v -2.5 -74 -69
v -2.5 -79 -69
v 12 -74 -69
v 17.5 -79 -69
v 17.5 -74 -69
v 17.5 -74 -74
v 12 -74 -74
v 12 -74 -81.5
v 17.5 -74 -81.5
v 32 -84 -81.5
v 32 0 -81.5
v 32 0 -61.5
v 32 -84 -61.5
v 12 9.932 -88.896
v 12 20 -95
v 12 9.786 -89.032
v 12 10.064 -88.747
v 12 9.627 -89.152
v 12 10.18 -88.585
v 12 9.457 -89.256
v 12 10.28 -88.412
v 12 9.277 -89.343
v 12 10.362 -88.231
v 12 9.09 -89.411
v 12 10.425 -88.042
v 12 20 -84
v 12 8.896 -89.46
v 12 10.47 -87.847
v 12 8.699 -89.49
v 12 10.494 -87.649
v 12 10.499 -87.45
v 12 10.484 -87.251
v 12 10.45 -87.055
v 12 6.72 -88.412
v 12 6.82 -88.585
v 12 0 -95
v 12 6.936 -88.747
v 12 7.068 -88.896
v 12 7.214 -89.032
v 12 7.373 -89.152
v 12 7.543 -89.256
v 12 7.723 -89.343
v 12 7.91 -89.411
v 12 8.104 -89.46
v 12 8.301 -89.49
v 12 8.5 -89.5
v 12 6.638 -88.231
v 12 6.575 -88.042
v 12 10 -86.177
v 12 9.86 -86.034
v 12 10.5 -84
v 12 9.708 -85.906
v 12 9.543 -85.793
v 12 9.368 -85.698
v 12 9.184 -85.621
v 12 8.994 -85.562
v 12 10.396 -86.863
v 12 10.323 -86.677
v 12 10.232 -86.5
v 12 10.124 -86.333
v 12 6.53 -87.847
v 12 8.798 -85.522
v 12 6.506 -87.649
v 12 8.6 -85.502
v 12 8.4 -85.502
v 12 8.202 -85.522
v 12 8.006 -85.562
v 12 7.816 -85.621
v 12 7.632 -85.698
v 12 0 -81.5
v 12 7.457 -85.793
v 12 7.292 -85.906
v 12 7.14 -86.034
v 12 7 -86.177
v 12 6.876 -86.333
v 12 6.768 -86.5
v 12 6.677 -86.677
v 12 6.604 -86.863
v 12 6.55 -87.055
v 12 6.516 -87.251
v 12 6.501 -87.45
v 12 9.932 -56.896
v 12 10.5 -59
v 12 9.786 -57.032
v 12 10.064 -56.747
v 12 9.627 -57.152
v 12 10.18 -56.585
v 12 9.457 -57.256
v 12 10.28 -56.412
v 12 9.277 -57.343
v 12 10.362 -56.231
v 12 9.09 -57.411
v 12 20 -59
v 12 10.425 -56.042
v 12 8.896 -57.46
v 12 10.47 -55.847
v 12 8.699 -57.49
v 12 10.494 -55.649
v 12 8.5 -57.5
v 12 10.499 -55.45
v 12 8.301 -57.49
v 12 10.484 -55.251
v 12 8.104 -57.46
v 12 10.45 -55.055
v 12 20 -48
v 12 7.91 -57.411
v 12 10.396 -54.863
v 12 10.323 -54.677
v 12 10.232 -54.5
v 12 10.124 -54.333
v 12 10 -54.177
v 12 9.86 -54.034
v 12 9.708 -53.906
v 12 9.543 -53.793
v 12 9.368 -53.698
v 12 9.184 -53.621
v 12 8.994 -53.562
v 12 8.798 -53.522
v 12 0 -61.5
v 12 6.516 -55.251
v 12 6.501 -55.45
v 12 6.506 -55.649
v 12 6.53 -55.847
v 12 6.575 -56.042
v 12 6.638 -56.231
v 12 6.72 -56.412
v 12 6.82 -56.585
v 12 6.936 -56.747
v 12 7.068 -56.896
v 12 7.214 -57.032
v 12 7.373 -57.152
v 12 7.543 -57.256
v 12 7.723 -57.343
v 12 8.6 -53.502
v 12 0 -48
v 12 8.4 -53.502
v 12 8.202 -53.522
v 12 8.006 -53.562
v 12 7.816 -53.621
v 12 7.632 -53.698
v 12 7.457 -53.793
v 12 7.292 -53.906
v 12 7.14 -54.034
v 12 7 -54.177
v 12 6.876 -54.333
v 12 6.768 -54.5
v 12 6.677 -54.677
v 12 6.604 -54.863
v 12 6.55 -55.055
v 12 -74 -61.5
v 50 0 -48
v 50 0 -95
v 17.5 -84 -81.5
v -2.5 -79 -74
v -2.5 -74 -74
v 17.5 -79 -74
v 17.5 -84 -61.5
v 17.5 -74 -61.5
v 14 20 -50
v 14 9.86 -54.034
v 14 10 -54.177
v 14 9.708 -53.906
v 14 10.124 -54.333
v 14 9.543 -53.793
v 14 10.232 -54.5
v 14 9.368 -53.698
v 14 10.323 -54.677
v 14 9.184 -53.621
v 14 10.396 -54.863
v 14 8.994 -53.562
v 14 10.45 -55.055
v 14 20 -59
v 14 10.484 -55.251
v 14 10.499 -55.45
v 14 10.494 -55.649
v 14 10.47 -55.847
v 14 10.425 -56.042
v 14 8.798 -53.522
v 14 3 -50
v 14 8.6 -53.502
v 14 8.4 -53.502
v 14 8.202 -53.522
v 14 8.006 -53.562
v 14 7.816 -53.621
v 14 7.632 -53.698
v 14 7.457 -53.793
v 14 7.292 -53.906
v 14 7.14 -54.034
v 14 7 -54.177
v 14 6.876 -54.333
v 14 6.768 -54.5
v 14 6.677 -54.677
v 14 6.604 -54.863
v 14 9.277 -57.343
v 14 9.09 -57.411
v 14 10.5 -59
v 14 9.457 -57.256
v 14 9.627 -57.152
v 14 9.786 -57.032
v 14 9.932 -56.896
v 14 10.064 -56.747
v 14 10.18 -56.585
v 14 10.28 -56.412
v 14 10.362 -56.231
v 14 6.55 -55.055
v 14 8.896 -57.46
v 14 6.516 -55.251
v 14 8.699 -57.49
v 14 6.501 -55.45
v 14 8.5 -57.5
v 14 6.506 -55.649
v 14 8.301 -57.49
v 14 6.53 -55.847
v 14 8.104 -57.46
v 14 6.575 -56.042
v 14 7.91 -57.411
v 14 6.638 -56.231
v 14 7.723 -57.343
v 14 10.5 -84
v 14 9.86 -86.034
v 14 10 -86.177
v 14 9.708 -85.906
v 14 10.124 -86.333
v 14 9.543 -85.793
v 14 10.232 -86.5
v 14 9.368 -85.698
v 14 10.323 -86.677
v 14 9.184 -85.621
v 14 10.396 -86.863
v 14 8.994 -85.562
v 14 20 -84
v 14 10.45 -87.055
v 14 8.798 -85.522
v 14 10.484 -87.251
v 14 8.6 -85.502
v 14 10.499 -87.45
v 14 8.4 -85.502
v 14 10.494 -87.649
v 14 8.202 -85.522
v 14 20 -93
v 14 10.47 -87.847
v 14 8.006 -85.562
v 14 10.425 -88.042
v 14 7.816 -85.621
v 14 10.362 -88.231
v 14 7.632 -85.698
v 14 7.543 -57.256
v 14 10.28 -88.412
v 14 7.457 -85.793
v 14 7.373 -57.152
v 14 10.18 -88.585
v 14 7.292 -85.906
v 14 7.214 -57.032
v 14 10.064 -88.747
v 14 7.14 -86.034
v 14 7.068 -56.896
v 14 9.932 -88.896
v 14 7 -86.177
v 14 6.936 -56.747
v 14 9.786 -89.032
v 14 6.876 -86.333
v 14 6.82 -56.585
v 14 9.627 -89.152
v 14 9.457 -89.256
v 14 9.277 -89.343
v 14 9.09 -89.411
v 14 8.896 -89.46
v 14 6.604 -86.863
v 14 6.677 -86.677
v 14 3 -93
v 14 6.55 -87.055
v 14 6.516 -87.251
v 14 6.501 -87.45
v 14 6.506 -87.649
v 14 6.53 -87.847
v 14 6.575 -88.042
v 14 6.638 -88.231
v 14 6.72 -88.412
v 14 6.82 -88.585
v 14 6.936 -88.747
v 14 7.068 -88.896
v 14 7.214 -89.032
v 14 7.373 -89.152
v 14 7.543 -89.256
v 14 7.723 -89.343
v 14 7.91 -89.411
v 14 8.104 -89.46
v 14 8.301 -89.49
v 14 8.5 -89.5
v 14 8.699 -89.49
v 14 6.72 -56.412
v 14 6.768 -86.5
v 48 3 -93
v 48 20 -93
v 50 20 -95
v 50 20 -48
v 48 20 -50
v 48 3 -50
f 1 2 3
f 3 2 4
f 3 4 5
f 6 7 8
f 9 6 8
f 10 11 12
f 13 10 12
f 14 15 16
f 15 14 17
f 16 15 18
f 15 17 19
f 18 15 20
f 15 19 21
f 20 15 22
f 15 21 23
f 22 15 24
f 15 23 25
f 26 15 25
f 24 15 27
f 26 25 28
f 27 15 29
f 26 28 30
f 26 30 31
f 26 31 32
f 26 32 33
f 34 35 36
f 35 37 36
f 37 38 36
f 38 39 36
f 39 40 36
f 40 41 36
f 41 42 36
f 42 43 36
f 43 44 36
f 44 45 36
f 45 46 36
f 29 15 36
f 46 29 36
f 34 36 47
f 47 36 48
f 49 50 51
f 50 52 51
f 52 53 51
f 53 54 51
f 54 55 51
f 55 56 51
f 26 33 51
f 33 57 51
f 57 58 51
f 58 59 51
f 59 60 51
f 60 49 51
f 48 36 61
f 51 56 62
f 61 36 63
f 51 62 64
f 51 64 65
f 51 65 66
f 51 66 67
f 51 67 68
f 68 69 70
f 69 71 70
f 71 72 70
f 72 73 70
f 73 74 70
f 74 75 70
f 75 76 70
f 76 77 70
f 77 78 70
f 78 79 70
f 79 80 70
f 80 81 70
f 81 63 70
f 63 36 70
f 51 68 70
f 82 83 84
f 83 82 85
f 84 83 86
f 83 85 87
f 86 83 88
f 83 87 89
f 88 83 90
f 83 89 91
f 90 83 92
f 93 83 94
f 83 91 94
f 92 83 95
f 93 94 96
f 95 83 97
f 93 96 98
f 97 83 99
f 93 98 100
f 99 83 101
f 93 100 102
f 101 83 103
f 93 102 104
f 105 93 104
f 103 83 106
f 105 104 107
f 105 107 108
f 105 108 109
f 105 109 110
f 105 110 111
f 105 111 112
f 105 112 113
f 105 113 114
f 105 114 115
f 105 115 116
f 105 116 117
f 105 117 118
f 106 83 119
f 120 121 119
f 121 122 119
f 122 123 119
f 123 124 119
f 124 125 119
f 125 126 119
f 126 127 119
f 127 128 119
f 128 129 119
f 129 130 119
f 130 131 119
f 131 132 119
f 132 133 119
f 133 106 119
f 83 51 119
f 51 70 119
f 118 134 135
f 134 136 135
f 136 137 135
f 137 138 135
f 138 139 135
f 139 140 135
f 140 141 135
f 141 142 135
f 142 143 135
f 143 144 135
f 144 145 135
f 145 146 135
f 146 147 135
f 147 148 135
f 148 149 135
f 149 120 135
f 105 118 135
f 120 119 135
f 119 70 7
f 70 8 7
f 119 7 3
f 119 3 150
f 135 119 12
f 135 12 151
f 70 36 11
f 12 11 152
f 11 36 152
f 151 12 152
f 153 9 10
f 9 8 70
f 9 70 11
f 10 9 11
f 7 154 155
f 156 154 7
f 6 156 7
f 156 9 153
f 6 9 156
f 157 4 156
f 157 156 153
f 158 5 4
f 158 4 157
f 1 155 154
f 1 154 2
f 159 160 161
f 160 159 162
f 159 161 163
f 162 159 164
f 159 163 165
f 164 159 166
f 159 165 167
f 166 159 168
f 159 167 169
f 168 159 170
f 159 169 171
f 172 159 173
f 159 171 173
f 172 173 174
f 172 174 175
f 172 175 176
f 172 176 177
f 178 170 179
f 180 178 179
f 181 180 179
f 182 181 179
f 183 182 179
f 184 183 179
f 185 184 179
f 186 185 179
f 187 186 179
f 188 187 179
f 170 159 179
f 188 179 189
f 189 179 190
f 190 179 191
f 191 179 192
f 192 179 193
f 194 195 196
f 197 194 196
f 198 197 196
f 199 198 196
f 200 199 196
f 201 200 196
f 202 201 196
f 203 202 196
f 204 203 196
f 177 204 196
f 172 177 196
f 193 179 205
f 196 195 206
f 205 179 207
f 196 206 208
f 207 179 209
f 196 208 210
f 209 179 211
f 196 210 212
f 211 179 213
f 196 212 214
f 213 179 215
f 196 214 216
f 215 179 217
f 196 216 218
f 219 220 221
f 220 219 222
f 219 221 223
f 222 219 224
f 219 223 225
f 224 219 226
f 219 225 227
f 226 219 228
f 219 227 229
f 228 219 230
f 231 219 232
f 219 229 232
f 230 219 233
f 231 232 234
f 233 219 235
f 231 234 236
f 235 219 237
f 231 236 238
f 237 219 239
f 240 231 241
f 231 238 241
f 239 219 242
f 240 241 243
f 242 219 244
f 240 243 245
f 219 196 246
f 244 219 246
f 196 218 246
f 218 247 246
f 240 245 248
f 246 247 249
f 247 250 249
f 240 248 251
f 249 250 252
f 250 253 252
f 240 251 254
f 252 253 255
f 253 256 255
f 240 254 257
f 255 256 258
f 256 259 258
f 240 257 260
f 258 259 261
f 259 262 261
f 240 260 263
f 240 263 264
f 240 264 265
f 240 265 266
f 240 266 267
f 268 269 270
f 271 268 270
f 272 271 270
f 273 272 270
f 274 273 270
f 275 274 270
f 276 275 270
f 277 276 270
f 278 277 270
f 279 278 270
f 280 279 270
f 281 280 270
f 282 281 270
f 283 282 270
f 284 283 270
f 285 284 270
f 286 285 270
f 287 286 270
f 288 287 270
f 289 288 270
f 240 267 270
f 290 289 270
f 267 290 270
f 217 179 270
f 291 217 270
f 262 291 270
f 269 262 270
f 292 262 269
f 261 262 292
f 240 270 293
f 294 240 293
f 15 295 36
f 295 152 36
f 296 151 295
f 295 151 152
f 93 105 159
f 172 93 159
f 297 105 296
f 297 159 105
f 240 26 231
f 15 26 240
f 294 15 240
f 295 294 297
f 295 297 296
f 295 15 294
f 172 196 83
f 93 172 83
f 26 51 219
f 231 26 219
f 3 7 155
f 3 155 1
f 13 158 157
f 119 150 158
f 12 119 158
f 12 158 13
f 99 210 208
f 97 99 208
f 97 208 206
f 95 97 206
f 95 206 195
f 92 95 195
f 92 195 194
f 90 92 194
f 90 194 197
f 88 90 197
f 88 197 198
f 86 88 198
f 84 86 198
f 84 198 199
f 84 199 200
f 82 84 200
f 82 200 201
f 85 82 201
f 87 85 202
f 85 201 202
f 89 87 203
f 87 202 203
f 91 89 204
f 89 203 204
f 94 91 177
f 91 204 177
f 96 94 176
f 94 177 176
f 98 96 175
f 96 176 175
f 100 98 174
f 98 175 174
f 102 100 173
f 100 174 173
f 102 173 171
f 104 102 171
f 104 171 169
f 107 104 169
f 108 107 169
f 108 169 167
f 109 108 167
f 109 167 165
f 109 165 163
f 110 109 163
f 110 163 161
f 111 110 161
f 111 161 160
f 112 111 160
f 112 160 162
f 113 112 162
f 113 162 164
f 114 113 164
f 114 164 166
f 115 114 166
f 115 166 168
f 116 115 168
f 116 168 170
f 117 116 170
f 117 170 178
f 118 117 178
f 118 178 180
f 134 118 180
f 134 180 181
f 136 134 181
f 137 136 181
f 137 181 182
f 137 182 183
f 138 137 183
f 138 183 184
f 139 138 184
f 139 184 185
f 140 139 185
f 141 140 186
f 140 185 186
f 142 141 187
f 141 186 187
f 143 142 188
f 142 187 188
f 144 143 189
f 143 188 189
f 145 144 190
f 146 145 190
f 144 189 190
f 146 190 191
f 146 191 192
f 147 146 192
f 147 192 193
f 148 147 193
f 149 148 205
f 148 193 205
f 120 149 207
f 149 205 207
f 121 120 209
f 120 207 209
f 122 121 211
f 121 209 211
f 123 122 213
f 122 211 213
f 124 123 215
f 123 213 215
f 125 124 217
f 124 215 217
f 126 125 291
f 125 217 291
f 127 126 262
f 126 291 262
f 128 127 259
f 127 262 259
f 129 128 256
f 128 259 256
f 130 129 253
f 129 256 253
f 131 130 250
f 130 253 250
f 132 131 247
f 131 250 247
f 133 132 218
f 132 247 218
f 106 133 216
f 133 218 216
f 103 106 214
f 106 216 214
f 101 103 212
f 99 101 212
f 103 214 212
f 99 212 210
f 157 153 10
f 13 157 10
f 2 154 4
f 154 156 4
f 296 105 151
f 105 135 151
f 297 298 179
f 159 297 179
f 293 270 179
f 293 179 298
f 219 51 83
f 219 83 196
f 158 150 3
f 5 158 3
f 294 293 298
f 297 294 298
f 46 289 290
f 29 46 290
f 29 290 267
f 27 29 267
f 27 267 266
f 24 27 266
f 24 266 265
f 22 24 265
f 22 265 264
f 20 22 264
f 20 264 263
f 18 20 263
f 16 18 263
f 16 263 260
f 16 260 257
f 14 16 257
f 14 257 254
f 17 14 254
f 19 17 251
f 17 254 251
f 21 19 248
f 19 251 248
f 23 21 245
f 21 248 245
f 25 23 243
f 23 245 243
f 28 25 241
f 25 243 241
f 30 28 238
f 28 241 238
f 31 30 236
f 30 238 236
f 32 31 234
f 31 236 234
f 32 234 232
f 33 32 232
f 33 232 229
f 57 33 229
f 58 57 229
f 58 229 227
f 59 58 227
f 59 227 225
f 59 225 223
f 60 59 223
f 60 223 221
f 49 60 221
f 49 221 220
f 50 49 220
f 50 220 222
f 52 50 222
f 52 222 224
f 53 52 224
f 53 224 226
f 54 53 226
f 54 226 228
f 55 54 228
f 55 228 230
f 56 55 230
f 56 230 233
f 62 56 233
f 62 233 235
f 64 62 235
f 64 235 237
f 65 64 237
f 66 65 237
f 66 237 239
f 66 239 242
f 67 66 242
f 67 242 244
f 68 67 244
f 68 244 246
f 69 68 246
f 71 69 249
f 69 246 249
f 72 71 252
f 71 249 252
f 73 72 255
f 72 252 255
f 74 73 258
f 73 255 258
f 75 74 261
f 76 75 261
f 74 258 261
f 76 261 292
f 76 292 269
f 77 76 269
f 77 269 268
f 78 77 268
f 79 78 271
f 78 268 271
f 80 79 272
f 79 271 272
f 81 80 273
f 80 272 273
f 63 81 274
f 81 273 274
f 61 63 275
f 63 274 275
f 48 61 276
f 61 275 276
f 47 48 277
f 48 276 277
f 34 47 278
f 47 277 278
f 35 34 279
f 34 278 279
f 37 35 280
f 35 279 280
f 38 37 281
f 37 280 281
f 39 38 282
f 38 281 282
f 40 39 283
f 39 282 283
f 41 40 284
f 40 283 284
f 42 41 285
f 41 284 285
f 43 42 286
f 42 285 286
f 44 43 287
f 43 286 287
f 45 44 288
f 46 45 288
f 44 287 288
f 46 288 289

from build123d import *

# Parameters (mm, degrees)
SKETCH3_W            = 38
SKETCH3_H            = 47
SKETCH3_W_2          = 34
SKETCH3_H_2          = 43
BOSS_EXTRUDE4_DEPTH  = 10.5
SKETCH1_W            = 34
SKETCH1_H            = 43
BOSS_EXTRUDE5_DEPTH  = 3
BOSS_EXTRUDE6_DEPTH  = 9.5
CUT_EXTRUDE1_REACH   = 4
SKETCH6_R            = 2
SKETCH8_W            = 20
SKETCH8_H            = 20
BOSS_EXTRUDE7_DEPTH  = 84
CUT_EXTRUDE2_DEPTH   = 5.5
SKETCH12_W           = 5
SKETCH12_H           = 5
BOSS_EXTRUDE11_DEPTH = 14.5


with BuildPart() as part:
    # Sketch3 → Boss-Extrude4 (new body)
    with BuildSketch(Plane(origin=(0, 0, 0), x_dir=(1, 0, 0), z_dir=(0, 1, 0))):
        with Locations((31, 71.5)):
            Rectangle(SKETCH3_W, SKETCH3_H)
        with Locations((31, 71.5)):
            Rectangle(SKETCH3_W_2, SKETCH3_H_2, mode=Mode.SUBTRACT)
    extrude(amount=BOSS_EXTRUDE4_DEPTH)

    # Sketch1 → Boss-Extrude5 (add)
    with BuildSketch(Plane(origin=(0, 0, 0), x_dir=(1, 0, 0), z_dir=(0, 1, 0))):
        with Locations((31, 71.5)):
            Rectangle(SKETCH1_W, SKETCH1_H)
    extrude(amount=BOSS_EXTRUDE5_DEPTH)

    # Sketch7 → Boss-Extrude6 (add)
    with BuildSketch(Plane(origin=(0, 10.5, 0), x_dir=(1, 0, 0), z_dir=(0, 1, 0))):
        Polygon((14, 50), (14, 59), (12, 59), (12, 48), (50, 48), (50, 95), (12, 95), (12, 84), (14, 84), (14, 93), (48, 93), (48, 50), align=None)
    extrude(amount=BOSS_EXTRUDE6_DEPTH)

    # Sketch6 → Cut-Extrude1 (cut, up to next)
    with BuildSketch(Plane(origin=(14, 0, 0), x_dir=(0, 0, -1), z_dir=(1, 0, 0)), mode=Mode.PRIVATE) as cut_extrude1_sk1:
        with Locations((55.5, 8.5)):
            Circle(SKETCH6_R)
    cut_extrude1_tool1 = extrude(cut_extrude1_sk1.sketch, amount=-CUT_EXTRUDE1_REACH, mode=Mode.PRIVATE) & part.part
    add(cut_extrude1_tool1.solids().sort_by_distance((14, 8.5, -55.5))[0], mode=Mode.SUBTRACT)
    # Sketch6 → Cut-Extrude1 (cut, up to next)
    with BuildSketch(Plane(origin=(14, 0, 0), x_dir=(0, 0, -1), z_dir=(1, 0, 0)), mode=Mode.PRIVATE) as cut_extrude1_sk2:
        with Locations((87.5, 8.5)):
            Circle(SKETCH6_R)
    cut_extrude1_tool2 = extrude(cut_extrude1_sk2.sketch, amount=-CUT_EXTRUDE1_REACH, mode=Mode.PRIVATE) & part.part
    add(cut_extrude1_tool2.solids().sort_by_distance((14, 8.5, -87.5))[0], mode=Mode.SUBTRACT)

    # Sketch8 → Boss-Extrude7 (add)
    with BuildSketch(Plane.XZ):
        with Locations((22, -71.5)):
            Rectangle(SKETCH8_W, SKETCH8_H)
    extrude(amount=BOSS_EXTRUDE7_DEPTH)

    # Sketch11 → Cut-Extrude2 (cut)
    with BuildSketch(Plane.ZY.offset(-12)):
        Polygon((-74, -74), (-81.5, -74), (-81.5, -84), (-61.5, -84), (-61.5, -74), (-69, -74), (-69, -79), (-74, -79), align=None)
    extrude(amount=-CUT_EXTRUDE2_DEPTH, mode=Mode.SUBTRACT)

    # Sketch12 → Boss-Extrude11 (add)
    with BuildSketch(Plane.ZY.offset(-12)):
        with Locations((-71.5, -76.5)):
            Rectangle(SKETCH12_W, SKETCH12_H)
    extrude(amount=BOSS_EXTRUDE11_DEPTH)


solid = part.part
